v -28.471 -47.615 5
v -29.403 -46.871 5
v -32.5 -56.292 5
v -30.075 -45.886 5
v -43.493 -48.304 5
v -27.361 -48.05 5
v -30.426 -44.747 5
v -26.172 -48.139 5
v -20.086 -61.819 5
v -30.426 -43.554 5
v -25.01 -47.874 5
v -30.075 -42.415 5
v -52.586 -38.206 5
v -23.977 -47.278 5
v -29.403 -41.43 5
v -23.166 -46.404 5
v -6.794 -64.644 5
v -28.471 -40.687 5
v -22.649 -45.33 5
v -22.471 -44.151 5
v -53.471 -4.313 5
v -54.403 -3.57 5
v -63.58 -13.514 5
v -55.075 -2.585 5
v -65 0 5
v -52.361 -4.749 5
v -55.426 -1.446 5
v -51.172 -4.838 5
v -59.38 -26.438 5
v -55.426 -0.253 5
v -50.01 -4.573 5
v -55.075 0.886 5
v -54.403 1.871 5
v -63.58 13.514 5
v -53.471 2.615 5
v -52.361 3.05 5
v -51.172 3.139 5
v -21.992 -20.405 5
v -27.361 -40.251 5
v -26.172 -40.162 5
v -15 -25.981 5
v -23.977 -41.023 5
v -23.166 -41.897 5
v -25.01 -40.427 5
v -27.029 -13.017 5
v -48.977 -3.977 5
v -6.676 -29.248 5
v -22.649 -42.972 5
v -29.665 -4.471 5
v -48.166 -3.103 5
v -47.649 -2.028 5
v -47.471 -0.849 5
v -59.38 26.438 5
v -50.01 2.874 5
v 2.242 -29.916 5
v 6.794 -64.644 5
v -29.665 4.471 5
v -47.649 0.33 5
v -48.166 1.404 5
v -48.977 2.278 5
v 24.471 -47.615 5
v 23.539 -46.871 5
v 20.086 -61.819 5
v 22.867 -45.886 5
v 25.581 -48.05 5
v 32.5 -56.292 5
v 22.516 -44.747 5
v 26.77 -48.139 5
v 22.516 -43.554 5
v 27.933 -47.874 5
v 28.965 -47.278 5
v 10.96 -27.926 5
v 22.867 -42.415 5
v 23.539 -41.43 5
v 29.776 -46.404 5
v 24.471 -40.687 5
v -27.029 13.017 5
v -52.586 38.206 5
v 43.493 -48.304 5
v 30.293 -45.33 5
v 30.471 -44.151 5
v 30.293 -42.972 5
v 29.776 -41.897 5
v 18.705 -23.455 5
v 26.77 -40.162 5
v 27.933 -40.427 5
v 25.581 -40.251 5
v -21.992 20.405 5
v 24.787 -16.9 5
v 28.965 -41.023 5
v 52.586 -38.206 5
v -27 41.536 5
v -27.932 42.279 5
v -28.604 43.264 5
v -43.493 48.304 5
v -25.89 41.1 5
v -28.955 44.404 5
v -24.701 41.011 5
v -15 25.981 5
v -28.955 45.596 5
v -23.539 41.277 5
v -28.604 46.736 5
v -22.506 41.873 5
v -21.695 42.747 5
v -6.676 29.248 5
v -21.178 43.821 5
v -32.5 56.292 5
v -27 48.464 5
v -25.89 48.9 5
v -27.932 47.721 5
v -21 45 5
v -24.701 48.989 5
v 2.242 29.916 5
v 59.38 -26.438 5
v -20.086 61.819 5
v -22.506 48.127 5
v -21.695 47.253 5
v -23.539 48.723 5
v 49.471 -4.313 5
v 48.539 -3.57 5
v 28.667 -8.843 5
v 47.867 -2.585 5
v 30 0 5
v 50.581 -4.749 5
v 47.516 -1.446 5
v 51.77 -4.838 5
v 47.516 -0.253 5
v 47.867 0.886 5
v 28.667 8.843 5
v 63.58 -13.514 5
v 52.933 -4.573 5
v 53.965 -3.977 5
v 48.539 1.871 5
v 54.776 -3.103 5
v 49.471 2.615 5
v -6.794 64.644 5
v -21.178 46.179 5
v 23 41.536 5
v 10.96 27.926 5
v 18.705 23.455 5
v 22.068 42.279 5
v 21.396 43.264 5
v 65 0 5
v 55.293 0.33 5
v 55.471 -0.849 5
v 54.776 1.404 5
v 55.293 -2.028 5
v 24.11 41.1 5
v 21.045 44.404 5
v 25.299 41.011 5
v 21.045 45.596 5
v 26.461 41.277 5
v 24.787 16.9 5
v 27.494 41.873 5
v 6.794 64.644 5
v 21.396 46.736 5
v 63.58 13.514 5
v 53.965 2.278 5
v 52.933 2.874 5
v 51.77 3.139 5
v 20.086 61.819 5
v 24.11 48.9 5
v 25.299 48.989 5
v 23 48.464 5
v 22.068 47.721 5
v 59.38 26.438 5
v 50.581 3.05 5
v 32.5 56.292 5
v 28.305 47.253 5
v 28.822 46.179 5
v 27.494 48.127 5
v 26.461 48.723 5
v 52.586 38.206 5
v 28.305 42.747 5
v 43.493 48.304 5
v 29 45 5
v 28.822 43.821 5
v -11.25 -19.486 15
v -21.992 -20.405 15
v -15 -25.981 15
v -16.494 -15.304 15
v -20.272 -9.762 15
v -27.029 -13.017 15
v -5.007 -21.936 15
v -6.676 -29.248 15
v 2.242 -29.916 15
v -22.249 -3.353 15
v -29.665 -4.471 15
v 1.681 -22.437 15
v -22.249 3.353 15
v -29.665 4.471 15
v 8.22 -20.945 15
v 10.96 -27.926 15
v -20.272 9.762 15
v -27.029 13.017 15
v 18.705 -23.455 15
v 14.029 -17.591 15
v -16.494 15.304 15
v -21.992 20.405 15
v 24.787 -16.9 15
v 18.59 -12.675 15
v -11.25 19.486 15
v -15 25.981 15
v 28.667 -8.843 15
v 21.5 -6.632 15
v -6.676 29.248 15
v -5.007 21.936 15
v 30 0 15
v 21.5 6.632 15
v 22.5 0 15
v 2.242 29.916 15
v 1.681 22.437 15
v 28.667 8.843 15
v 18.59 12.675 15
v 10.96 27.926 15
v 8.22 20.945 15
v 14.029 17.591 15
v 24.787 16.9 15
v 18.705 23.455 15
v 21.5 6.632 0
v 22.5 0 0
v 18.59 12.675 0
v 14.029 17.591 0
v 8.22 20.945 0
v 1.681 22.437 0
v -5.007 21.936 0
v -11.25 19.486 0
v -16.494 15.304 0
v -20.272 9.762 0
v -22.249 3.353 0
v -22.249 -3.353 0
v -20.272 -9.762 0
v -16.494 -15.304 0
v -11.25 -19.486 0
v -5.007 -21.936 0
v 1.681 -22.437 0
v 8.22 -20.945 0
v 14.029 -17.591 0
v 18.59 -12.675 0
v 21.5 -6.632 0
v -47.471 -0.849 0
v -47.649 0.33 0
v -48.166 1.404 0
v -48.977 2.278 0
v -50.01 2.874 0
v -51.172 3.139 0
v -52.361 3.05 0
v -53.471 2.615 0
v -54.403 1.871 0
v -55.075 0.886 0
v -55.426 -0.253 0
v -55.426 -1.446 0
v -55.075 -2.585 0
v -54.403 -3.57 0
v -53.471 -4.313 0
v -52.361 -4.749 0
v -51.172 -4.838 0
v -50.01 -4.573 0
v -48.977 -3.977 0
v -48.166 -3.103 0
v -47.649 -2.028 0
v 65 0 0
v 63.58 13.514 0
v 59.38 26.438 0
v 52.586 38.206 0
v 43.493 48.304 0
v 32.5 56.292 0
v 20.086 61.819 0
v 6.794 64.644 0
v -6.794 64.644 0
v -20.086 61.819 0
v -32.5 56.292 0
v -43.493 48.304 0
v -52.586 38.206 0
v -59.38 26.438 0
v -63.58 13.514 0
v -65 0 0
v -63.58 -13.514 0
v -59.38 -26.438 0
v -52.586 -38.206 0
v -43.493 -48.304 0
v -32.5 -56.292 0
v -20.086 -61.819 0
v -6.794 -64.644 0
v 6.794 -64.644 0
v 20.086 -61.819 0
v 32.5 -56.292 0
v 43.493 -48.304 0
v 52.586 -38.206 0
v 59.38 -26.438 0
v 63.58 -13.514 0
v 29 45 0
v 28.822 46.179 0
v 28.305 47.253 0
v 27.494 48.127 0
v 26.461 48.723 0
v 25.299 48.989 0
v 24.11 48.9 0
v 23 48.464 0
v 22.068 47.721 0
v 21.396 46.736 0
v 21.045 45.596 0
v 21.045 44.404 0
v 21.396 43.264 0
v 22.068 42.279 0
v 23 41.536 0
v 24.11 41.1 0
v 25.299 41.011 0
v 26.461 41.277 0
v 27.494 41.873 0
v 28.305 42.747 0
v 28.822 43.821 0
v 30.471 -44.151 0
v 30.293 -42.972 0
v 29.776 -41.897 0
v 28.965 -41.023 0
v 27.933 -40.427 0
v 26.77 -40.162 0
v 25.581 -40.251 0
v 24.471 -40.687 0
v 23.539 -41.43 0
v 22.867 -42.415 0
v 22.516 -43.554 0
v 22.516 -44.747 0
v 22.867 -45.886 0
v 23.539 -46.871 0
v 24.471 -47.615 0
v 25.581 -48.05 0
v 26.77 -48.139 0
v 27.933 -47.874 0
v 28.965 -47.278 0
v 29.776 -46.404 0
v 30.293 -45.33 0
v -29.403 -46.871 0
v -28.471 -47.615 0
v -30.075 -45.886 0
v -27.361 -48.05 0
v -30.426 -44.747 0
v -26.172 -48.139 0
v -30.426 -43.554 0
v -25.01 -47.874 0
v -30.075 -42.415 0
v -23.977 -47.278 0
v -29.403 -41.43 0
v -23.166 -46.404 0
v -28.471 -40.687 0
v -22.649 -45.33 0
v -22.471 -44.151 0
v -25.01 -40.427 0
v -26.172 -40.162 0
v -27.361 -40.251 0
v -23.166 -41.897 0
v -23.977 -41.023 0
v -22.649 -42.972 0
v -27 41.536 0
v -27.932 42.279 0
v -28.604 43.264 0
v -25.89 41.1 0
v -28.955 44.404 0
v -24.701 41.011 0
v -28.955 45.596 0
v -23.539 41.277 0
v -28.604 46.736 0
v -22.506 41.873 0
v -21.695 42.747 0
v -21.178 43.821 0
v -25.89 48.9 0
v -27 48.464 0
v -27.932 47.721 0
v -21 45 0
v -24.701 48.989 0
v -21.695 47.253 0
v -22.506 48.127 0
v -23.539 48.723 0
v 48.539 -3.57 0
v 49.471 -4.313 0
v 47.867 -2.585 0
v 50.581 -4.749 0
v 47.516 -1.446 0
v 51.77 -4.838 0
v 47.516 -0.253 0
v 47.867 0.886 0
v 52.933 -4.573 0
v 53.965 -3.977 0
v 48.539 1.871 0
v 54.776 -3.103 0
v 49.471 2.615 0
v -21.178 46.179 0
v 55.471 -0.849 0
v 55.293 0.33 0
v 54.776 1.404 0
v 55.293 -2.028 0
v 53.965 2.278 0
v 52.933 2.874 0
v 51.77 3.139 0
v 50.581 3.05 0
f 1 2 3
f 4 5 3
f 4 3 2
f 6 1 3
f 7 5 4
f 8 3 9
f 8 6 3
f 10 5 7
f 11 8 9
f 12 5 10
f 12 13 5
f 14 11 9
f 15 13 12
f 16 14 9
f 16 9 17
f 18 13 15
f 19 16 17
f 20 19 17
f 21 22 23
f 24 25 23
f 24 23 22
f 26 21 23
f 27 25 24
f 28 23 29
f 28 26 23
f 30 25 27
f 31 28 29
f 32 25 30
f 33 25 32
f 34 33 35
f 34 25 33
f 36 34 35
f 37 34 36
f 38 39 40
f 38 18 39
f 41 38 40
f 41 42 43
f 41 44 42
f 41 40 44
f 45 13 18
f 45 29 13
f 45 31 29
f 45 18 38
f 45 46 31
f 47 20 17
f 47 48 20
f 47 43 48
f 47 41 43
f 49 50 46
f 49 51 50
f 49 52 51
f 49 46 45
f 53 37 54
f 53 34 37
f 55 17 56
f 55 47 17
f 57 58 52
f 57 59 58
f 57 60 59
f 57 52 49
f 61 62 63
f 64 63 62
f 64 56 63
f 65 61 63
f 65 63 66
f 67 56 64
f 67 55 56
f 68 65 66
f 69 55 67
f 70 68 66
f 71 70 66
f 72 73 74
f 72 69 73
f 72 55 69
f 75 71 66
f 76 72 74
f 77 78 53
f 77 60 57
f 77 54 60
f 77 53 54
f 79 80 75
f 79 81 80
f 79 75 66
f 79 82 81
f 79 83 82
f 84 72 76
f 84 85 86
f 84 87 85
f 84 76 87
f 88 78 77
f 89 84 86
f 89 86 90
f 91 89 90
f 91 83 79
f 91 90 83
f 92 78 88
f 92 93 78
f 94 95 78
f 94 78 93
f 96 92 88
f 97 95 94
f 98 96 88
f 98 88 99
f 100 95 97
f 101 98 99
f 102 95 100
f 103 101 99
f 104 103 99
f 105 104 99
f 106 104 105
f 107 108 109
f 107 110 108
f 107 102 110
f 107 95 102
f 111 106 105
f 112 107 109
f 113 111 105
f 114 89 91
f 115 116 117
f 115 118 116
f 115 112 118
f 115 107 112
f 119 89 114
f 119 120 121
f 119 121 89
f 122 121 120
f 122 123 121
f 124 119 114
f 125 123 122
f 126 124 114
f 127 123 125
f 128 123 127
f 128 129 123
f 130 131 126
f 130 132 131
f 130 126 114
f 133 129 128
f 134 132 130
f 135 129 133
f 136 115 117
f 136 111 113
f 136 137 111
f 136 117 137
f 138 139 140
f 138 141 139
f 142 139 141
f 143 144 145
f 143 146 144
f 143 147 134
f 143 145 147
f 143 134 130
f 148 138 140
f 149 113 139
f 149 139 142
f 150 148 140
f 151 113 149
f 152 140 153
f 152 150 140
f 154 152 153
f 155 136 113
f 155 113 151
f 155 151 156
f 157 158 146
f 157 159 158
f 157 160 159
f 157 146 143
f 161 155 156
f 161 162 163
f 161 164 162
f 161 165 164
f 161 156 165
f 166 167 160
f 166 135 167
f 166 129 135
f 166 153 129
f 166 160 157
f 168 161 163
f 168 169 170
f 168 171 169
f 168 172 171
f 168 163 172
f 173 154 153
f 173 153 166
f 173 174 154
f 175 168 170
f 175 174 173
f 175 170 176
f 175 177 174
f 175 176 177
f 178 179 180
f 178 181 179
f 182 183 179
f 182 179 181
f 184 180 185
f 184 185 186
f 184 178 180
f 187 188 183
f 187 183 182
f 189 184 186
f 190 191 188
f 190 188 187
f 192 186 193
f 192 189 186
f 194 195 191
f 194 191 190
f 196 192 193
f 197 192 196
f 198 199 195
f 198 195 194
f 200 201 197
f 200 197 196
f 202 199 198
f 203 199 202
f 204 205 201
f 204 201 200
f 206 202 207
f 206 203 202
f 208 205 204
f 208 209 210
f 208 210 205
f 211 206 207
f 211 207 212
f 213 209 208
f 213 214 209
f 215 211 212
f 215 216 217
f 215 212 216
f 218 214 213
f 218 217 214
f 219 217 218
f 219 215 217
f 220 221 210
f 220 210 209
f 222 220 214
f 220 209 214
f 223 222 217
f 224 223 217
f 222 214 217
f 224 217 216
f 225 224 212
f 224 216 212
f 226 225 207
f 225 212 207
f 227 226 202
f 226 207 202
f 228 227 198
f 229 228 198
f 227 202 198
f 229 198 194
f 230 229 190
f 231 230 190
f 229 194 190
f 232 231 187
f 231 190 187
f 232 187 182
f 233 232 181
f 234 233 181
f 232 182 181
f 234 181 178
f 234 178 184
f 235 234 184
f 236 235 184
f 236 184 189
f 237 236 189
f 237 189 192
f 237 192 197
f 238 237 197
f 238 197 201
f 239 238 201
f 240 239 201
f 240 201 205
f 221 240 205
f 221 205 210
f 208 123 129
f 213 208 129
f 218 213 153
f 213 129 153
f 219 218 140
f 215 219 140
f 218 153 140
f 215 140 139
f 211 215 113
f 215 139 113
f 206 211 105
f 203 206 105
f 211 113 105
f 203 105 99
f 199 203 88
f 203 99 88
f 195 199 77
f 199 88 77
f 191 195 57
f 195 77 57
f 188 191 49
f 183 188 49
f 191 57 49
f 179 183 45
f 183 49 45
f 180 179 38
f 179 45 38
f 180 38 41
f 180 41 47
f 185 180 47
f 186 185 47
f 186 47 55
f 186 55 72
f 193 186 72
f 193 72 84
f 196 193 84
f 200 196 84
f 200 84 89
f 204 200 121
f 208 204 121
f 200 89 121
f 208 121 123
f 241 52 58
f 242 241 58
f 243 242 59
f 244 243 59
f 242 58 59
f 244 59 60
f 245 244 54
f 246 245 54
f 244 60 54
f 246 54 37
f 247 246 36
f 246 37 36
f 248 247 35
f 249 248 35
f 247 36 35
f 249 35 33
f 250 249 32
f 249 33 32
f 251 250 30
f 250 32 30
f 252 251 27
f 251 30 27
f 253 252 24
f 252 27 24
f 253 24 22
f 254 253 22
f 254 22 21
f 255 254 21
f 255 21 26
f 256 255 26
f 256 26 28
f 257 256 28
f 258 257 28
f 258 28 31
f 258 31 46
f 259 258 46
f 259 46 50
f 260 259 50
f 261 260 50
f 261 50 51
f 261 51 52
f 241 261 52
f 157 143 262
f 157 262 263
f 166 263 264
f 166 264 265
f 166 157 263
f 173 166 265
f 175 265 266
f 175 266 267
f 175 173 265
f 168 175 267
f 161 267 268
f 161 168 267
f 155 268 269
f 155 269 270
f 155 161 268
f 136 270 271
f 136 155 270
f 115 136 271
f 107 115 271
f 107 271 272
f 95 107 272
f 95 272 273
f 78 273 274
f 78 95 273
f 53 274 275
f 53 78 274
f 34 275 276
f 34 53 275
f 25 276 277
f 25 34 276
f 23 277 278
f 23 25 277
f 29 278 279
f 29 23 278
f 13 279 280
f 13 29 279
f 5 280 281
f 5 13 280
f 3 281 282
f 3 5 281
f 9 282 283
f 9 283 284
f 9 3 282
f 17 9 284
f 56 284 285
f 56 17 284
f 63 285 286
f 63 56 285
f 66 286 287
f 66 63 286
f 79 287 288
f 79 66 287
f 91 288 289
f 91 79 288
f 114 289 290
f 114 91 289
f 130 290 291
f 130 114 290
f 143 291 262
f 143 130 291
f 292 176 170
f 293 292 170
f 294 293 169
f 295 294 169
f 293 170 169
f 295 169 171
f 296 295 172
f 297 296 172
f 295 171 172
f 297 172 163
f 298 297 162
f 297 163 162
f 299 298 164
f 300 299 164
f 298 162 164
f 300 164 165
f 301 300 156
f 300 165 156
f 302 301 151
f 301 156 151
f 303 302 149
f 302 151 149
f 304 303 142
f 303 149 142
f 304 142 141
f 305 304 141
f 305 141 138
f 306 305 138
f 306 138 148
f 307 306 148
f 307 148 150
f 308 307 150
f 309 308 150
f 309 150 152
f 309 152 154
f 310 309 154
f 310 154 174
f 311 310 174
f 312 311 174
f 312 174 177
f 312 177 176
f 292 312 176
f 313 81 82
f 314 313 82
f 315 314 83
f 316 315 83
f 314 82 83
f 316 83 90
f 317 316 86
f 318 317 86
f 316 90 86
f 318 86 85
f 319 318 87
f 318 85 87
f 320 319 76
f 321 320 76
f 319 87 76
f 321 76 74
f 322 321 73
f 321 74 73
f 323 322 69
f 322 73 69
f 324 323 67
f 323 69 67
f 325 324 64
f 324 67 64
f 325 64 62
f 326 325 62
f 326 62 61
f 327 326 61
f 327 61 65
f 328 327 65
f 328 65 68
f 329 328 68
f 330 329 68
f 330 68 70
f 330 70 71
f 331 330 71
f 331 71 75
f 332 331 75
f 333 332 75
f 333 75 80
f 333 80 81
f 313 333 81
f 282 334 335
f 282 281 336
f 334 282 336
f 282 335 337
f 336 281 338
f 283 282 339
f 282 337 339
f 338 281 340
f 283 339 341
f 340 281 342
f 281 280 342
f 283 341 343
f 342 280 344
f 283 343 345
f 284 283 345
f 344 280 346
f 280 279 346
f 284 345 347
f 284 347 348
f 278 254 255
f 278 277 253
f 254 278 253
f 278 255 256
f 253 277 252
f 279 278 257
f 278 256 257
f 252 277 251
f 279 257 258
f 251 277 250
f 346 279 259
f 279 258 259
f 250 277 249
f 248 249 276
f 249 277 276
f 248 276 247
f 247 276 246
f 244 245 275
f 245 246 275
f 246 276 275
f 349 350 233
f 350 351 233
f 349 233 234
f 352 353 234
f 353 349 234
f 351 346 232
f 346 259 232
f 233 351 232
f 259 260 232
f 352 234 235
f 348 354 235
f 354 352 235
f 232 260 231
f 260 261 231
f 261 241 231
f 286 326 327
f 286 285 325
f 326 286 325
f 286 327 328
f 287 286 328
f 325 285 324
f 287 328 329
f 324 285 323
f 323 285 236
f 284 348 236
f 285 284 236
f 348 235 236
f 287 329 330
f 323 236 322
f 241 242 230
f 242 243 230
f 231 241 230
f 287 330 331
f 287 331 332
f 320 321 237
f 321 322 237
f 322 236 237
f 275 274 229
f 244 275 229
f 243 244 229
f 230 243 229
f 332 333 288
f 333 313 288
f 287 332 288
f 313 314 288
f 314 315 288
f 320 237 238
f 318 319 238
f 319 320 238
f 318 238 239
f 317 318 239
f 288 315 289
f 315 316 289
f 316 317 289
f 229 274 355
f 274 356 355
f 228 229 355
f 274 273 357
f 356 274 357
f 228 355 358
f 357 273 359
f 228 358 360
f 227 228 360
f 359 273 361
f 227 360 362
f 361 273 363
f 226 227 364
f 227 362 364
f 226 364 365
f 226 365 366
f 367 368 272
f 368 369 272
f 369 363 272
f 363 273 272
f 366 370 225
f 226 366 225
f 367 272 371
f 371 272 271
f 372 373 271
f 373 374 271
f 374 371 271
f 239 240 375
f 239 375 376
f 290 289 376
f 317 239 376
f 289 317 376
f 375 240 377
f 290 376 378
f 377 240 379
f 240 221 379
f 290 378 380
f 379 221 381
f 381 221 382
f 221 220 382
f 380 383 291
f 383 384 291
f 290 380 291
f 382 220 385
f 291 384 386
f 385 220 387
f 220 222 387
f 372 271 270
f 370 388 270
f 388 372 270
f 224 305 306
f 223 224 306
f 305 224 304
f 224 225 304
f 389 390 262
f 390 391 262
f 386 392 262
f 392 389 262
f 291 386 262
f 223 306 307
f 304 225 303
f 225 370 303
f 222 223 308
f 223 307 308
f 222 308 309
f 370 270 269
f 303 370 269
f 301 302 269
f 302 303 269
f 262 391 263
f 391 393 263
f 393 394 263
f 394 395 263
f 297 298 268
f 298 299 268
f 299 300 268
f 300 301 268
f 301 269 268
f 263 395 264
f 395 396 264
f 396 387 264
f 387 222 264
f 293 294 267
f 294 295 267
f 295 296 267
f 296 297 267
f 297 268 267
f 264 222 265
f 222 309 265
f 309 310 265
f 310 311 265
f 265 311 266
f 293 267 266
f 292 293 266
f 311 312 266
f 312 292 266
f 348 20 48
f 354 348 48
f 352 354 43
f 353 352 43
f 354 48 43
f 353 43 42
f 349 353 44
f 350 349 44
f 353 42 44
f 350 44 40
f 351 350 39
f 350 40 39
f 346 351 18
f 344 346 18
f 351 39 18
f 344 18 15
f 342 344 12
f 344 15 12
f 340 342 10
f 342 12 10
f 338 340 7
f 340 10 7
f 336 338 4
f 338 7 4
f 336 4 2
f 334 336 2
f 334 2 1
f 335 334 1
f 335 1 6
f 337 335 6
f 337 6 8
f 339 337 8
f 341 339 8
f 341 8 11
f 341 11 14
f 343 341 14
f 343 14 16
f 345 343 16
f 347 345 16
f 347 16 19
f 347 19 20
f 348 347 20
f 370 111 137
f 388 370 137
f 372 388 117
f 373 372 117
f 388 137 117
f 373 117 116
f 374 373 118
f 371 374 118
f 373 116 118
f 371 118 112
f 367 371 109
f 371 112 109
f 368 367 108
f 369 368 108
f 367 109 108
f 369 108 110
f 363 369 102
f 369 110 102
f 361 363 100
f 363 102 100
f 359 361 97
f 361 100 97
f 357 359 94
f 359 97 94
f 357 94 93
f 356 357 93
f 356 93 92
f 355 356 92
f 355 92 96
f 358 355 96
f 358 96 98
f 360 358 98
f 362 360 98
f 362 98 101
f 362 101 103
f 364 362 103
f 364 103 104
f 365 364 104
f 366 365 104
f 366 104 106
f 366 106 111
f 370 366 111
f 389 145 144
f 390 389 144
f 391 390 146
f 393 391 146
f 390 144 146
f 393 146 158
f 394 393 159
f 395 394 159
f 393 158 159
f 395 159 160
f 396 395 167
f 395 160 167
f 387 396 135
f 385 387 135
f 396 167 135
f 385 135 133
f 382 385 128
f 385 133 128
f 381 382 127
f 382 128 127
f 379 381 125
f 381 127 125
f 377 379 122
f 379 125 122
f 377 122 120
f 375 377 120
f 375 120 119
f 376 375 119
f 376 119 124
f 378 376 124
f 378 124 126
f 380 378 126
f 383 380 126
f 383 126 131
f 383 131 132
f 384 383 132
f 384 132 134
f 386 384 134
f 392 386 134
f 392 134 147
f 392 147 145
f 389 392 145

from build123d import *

# Parameters (mm, degrees)
SKETCH1_R           = 65
BOSS_EXTRUDE1_DEPTH = 5
SKETCH11_R          = 4
CUT_EXTRUDE1_DEPTH  = 10
SKETCH12_R          = 30
BOSS_EXTRUDE2_DEPTH = 10
SKETCH13_R          = 22.5
CUT_EXTRUDE2_DEPTH  = 16


with BuildPart() as part:
    # Sketch1 → Boss-Extrude1 (new body)
    with BuildSketch(Plane.XY.offset(5)):
        Circle(SKETCH1_R)
    extrude(amount=-BOSS_EXTRUDE1_DEPTH)

    # Sketch11 → Cut-Extrude1 (cut)
    with BuildSketch(Plane.XY.offset(5)):
        with Locations((-25, 45)):
            Circle(SKETCH11_R)
        with Locations((25, 45)):
            Circle(SKETCH11_R)
        with Locations((26.47114317, -44.150635095)):
            Circle(SKETCH11_R)
        with Locations((51.47114317, -0.849364905)):
            Circle(SKETCH11_R)
        with Locations((-51.47114317, -0.849364905)):
            Circle(SKETCH11_R)
        with Locations((-26.47114317, -44.150635095)):
            Circle(SKETCH11_R)
    extrude(amount=-CUT_EXTRUDE1_DEPTH, mode=Mode.SUBTRACT)

    # Sketch12 → Boss-Extrude2 (add)
    with BuildSketch(Plane.XY.offset(5)):
        Circle(SKETCH12_R)
    extrude(amount=BOSS_EXTRUDE2_DEPTH)

    # Sketch13 → Cut-Extrude2 (cut, through all)
    with BuildSketch(Plane.XY.offset(15)):
        Circle(SKETCH13_R)
    extrude(amount=-CUT_EXTRUDE2_DEPTH, mode=Mode.SUBTRACT)


solid = part.part
